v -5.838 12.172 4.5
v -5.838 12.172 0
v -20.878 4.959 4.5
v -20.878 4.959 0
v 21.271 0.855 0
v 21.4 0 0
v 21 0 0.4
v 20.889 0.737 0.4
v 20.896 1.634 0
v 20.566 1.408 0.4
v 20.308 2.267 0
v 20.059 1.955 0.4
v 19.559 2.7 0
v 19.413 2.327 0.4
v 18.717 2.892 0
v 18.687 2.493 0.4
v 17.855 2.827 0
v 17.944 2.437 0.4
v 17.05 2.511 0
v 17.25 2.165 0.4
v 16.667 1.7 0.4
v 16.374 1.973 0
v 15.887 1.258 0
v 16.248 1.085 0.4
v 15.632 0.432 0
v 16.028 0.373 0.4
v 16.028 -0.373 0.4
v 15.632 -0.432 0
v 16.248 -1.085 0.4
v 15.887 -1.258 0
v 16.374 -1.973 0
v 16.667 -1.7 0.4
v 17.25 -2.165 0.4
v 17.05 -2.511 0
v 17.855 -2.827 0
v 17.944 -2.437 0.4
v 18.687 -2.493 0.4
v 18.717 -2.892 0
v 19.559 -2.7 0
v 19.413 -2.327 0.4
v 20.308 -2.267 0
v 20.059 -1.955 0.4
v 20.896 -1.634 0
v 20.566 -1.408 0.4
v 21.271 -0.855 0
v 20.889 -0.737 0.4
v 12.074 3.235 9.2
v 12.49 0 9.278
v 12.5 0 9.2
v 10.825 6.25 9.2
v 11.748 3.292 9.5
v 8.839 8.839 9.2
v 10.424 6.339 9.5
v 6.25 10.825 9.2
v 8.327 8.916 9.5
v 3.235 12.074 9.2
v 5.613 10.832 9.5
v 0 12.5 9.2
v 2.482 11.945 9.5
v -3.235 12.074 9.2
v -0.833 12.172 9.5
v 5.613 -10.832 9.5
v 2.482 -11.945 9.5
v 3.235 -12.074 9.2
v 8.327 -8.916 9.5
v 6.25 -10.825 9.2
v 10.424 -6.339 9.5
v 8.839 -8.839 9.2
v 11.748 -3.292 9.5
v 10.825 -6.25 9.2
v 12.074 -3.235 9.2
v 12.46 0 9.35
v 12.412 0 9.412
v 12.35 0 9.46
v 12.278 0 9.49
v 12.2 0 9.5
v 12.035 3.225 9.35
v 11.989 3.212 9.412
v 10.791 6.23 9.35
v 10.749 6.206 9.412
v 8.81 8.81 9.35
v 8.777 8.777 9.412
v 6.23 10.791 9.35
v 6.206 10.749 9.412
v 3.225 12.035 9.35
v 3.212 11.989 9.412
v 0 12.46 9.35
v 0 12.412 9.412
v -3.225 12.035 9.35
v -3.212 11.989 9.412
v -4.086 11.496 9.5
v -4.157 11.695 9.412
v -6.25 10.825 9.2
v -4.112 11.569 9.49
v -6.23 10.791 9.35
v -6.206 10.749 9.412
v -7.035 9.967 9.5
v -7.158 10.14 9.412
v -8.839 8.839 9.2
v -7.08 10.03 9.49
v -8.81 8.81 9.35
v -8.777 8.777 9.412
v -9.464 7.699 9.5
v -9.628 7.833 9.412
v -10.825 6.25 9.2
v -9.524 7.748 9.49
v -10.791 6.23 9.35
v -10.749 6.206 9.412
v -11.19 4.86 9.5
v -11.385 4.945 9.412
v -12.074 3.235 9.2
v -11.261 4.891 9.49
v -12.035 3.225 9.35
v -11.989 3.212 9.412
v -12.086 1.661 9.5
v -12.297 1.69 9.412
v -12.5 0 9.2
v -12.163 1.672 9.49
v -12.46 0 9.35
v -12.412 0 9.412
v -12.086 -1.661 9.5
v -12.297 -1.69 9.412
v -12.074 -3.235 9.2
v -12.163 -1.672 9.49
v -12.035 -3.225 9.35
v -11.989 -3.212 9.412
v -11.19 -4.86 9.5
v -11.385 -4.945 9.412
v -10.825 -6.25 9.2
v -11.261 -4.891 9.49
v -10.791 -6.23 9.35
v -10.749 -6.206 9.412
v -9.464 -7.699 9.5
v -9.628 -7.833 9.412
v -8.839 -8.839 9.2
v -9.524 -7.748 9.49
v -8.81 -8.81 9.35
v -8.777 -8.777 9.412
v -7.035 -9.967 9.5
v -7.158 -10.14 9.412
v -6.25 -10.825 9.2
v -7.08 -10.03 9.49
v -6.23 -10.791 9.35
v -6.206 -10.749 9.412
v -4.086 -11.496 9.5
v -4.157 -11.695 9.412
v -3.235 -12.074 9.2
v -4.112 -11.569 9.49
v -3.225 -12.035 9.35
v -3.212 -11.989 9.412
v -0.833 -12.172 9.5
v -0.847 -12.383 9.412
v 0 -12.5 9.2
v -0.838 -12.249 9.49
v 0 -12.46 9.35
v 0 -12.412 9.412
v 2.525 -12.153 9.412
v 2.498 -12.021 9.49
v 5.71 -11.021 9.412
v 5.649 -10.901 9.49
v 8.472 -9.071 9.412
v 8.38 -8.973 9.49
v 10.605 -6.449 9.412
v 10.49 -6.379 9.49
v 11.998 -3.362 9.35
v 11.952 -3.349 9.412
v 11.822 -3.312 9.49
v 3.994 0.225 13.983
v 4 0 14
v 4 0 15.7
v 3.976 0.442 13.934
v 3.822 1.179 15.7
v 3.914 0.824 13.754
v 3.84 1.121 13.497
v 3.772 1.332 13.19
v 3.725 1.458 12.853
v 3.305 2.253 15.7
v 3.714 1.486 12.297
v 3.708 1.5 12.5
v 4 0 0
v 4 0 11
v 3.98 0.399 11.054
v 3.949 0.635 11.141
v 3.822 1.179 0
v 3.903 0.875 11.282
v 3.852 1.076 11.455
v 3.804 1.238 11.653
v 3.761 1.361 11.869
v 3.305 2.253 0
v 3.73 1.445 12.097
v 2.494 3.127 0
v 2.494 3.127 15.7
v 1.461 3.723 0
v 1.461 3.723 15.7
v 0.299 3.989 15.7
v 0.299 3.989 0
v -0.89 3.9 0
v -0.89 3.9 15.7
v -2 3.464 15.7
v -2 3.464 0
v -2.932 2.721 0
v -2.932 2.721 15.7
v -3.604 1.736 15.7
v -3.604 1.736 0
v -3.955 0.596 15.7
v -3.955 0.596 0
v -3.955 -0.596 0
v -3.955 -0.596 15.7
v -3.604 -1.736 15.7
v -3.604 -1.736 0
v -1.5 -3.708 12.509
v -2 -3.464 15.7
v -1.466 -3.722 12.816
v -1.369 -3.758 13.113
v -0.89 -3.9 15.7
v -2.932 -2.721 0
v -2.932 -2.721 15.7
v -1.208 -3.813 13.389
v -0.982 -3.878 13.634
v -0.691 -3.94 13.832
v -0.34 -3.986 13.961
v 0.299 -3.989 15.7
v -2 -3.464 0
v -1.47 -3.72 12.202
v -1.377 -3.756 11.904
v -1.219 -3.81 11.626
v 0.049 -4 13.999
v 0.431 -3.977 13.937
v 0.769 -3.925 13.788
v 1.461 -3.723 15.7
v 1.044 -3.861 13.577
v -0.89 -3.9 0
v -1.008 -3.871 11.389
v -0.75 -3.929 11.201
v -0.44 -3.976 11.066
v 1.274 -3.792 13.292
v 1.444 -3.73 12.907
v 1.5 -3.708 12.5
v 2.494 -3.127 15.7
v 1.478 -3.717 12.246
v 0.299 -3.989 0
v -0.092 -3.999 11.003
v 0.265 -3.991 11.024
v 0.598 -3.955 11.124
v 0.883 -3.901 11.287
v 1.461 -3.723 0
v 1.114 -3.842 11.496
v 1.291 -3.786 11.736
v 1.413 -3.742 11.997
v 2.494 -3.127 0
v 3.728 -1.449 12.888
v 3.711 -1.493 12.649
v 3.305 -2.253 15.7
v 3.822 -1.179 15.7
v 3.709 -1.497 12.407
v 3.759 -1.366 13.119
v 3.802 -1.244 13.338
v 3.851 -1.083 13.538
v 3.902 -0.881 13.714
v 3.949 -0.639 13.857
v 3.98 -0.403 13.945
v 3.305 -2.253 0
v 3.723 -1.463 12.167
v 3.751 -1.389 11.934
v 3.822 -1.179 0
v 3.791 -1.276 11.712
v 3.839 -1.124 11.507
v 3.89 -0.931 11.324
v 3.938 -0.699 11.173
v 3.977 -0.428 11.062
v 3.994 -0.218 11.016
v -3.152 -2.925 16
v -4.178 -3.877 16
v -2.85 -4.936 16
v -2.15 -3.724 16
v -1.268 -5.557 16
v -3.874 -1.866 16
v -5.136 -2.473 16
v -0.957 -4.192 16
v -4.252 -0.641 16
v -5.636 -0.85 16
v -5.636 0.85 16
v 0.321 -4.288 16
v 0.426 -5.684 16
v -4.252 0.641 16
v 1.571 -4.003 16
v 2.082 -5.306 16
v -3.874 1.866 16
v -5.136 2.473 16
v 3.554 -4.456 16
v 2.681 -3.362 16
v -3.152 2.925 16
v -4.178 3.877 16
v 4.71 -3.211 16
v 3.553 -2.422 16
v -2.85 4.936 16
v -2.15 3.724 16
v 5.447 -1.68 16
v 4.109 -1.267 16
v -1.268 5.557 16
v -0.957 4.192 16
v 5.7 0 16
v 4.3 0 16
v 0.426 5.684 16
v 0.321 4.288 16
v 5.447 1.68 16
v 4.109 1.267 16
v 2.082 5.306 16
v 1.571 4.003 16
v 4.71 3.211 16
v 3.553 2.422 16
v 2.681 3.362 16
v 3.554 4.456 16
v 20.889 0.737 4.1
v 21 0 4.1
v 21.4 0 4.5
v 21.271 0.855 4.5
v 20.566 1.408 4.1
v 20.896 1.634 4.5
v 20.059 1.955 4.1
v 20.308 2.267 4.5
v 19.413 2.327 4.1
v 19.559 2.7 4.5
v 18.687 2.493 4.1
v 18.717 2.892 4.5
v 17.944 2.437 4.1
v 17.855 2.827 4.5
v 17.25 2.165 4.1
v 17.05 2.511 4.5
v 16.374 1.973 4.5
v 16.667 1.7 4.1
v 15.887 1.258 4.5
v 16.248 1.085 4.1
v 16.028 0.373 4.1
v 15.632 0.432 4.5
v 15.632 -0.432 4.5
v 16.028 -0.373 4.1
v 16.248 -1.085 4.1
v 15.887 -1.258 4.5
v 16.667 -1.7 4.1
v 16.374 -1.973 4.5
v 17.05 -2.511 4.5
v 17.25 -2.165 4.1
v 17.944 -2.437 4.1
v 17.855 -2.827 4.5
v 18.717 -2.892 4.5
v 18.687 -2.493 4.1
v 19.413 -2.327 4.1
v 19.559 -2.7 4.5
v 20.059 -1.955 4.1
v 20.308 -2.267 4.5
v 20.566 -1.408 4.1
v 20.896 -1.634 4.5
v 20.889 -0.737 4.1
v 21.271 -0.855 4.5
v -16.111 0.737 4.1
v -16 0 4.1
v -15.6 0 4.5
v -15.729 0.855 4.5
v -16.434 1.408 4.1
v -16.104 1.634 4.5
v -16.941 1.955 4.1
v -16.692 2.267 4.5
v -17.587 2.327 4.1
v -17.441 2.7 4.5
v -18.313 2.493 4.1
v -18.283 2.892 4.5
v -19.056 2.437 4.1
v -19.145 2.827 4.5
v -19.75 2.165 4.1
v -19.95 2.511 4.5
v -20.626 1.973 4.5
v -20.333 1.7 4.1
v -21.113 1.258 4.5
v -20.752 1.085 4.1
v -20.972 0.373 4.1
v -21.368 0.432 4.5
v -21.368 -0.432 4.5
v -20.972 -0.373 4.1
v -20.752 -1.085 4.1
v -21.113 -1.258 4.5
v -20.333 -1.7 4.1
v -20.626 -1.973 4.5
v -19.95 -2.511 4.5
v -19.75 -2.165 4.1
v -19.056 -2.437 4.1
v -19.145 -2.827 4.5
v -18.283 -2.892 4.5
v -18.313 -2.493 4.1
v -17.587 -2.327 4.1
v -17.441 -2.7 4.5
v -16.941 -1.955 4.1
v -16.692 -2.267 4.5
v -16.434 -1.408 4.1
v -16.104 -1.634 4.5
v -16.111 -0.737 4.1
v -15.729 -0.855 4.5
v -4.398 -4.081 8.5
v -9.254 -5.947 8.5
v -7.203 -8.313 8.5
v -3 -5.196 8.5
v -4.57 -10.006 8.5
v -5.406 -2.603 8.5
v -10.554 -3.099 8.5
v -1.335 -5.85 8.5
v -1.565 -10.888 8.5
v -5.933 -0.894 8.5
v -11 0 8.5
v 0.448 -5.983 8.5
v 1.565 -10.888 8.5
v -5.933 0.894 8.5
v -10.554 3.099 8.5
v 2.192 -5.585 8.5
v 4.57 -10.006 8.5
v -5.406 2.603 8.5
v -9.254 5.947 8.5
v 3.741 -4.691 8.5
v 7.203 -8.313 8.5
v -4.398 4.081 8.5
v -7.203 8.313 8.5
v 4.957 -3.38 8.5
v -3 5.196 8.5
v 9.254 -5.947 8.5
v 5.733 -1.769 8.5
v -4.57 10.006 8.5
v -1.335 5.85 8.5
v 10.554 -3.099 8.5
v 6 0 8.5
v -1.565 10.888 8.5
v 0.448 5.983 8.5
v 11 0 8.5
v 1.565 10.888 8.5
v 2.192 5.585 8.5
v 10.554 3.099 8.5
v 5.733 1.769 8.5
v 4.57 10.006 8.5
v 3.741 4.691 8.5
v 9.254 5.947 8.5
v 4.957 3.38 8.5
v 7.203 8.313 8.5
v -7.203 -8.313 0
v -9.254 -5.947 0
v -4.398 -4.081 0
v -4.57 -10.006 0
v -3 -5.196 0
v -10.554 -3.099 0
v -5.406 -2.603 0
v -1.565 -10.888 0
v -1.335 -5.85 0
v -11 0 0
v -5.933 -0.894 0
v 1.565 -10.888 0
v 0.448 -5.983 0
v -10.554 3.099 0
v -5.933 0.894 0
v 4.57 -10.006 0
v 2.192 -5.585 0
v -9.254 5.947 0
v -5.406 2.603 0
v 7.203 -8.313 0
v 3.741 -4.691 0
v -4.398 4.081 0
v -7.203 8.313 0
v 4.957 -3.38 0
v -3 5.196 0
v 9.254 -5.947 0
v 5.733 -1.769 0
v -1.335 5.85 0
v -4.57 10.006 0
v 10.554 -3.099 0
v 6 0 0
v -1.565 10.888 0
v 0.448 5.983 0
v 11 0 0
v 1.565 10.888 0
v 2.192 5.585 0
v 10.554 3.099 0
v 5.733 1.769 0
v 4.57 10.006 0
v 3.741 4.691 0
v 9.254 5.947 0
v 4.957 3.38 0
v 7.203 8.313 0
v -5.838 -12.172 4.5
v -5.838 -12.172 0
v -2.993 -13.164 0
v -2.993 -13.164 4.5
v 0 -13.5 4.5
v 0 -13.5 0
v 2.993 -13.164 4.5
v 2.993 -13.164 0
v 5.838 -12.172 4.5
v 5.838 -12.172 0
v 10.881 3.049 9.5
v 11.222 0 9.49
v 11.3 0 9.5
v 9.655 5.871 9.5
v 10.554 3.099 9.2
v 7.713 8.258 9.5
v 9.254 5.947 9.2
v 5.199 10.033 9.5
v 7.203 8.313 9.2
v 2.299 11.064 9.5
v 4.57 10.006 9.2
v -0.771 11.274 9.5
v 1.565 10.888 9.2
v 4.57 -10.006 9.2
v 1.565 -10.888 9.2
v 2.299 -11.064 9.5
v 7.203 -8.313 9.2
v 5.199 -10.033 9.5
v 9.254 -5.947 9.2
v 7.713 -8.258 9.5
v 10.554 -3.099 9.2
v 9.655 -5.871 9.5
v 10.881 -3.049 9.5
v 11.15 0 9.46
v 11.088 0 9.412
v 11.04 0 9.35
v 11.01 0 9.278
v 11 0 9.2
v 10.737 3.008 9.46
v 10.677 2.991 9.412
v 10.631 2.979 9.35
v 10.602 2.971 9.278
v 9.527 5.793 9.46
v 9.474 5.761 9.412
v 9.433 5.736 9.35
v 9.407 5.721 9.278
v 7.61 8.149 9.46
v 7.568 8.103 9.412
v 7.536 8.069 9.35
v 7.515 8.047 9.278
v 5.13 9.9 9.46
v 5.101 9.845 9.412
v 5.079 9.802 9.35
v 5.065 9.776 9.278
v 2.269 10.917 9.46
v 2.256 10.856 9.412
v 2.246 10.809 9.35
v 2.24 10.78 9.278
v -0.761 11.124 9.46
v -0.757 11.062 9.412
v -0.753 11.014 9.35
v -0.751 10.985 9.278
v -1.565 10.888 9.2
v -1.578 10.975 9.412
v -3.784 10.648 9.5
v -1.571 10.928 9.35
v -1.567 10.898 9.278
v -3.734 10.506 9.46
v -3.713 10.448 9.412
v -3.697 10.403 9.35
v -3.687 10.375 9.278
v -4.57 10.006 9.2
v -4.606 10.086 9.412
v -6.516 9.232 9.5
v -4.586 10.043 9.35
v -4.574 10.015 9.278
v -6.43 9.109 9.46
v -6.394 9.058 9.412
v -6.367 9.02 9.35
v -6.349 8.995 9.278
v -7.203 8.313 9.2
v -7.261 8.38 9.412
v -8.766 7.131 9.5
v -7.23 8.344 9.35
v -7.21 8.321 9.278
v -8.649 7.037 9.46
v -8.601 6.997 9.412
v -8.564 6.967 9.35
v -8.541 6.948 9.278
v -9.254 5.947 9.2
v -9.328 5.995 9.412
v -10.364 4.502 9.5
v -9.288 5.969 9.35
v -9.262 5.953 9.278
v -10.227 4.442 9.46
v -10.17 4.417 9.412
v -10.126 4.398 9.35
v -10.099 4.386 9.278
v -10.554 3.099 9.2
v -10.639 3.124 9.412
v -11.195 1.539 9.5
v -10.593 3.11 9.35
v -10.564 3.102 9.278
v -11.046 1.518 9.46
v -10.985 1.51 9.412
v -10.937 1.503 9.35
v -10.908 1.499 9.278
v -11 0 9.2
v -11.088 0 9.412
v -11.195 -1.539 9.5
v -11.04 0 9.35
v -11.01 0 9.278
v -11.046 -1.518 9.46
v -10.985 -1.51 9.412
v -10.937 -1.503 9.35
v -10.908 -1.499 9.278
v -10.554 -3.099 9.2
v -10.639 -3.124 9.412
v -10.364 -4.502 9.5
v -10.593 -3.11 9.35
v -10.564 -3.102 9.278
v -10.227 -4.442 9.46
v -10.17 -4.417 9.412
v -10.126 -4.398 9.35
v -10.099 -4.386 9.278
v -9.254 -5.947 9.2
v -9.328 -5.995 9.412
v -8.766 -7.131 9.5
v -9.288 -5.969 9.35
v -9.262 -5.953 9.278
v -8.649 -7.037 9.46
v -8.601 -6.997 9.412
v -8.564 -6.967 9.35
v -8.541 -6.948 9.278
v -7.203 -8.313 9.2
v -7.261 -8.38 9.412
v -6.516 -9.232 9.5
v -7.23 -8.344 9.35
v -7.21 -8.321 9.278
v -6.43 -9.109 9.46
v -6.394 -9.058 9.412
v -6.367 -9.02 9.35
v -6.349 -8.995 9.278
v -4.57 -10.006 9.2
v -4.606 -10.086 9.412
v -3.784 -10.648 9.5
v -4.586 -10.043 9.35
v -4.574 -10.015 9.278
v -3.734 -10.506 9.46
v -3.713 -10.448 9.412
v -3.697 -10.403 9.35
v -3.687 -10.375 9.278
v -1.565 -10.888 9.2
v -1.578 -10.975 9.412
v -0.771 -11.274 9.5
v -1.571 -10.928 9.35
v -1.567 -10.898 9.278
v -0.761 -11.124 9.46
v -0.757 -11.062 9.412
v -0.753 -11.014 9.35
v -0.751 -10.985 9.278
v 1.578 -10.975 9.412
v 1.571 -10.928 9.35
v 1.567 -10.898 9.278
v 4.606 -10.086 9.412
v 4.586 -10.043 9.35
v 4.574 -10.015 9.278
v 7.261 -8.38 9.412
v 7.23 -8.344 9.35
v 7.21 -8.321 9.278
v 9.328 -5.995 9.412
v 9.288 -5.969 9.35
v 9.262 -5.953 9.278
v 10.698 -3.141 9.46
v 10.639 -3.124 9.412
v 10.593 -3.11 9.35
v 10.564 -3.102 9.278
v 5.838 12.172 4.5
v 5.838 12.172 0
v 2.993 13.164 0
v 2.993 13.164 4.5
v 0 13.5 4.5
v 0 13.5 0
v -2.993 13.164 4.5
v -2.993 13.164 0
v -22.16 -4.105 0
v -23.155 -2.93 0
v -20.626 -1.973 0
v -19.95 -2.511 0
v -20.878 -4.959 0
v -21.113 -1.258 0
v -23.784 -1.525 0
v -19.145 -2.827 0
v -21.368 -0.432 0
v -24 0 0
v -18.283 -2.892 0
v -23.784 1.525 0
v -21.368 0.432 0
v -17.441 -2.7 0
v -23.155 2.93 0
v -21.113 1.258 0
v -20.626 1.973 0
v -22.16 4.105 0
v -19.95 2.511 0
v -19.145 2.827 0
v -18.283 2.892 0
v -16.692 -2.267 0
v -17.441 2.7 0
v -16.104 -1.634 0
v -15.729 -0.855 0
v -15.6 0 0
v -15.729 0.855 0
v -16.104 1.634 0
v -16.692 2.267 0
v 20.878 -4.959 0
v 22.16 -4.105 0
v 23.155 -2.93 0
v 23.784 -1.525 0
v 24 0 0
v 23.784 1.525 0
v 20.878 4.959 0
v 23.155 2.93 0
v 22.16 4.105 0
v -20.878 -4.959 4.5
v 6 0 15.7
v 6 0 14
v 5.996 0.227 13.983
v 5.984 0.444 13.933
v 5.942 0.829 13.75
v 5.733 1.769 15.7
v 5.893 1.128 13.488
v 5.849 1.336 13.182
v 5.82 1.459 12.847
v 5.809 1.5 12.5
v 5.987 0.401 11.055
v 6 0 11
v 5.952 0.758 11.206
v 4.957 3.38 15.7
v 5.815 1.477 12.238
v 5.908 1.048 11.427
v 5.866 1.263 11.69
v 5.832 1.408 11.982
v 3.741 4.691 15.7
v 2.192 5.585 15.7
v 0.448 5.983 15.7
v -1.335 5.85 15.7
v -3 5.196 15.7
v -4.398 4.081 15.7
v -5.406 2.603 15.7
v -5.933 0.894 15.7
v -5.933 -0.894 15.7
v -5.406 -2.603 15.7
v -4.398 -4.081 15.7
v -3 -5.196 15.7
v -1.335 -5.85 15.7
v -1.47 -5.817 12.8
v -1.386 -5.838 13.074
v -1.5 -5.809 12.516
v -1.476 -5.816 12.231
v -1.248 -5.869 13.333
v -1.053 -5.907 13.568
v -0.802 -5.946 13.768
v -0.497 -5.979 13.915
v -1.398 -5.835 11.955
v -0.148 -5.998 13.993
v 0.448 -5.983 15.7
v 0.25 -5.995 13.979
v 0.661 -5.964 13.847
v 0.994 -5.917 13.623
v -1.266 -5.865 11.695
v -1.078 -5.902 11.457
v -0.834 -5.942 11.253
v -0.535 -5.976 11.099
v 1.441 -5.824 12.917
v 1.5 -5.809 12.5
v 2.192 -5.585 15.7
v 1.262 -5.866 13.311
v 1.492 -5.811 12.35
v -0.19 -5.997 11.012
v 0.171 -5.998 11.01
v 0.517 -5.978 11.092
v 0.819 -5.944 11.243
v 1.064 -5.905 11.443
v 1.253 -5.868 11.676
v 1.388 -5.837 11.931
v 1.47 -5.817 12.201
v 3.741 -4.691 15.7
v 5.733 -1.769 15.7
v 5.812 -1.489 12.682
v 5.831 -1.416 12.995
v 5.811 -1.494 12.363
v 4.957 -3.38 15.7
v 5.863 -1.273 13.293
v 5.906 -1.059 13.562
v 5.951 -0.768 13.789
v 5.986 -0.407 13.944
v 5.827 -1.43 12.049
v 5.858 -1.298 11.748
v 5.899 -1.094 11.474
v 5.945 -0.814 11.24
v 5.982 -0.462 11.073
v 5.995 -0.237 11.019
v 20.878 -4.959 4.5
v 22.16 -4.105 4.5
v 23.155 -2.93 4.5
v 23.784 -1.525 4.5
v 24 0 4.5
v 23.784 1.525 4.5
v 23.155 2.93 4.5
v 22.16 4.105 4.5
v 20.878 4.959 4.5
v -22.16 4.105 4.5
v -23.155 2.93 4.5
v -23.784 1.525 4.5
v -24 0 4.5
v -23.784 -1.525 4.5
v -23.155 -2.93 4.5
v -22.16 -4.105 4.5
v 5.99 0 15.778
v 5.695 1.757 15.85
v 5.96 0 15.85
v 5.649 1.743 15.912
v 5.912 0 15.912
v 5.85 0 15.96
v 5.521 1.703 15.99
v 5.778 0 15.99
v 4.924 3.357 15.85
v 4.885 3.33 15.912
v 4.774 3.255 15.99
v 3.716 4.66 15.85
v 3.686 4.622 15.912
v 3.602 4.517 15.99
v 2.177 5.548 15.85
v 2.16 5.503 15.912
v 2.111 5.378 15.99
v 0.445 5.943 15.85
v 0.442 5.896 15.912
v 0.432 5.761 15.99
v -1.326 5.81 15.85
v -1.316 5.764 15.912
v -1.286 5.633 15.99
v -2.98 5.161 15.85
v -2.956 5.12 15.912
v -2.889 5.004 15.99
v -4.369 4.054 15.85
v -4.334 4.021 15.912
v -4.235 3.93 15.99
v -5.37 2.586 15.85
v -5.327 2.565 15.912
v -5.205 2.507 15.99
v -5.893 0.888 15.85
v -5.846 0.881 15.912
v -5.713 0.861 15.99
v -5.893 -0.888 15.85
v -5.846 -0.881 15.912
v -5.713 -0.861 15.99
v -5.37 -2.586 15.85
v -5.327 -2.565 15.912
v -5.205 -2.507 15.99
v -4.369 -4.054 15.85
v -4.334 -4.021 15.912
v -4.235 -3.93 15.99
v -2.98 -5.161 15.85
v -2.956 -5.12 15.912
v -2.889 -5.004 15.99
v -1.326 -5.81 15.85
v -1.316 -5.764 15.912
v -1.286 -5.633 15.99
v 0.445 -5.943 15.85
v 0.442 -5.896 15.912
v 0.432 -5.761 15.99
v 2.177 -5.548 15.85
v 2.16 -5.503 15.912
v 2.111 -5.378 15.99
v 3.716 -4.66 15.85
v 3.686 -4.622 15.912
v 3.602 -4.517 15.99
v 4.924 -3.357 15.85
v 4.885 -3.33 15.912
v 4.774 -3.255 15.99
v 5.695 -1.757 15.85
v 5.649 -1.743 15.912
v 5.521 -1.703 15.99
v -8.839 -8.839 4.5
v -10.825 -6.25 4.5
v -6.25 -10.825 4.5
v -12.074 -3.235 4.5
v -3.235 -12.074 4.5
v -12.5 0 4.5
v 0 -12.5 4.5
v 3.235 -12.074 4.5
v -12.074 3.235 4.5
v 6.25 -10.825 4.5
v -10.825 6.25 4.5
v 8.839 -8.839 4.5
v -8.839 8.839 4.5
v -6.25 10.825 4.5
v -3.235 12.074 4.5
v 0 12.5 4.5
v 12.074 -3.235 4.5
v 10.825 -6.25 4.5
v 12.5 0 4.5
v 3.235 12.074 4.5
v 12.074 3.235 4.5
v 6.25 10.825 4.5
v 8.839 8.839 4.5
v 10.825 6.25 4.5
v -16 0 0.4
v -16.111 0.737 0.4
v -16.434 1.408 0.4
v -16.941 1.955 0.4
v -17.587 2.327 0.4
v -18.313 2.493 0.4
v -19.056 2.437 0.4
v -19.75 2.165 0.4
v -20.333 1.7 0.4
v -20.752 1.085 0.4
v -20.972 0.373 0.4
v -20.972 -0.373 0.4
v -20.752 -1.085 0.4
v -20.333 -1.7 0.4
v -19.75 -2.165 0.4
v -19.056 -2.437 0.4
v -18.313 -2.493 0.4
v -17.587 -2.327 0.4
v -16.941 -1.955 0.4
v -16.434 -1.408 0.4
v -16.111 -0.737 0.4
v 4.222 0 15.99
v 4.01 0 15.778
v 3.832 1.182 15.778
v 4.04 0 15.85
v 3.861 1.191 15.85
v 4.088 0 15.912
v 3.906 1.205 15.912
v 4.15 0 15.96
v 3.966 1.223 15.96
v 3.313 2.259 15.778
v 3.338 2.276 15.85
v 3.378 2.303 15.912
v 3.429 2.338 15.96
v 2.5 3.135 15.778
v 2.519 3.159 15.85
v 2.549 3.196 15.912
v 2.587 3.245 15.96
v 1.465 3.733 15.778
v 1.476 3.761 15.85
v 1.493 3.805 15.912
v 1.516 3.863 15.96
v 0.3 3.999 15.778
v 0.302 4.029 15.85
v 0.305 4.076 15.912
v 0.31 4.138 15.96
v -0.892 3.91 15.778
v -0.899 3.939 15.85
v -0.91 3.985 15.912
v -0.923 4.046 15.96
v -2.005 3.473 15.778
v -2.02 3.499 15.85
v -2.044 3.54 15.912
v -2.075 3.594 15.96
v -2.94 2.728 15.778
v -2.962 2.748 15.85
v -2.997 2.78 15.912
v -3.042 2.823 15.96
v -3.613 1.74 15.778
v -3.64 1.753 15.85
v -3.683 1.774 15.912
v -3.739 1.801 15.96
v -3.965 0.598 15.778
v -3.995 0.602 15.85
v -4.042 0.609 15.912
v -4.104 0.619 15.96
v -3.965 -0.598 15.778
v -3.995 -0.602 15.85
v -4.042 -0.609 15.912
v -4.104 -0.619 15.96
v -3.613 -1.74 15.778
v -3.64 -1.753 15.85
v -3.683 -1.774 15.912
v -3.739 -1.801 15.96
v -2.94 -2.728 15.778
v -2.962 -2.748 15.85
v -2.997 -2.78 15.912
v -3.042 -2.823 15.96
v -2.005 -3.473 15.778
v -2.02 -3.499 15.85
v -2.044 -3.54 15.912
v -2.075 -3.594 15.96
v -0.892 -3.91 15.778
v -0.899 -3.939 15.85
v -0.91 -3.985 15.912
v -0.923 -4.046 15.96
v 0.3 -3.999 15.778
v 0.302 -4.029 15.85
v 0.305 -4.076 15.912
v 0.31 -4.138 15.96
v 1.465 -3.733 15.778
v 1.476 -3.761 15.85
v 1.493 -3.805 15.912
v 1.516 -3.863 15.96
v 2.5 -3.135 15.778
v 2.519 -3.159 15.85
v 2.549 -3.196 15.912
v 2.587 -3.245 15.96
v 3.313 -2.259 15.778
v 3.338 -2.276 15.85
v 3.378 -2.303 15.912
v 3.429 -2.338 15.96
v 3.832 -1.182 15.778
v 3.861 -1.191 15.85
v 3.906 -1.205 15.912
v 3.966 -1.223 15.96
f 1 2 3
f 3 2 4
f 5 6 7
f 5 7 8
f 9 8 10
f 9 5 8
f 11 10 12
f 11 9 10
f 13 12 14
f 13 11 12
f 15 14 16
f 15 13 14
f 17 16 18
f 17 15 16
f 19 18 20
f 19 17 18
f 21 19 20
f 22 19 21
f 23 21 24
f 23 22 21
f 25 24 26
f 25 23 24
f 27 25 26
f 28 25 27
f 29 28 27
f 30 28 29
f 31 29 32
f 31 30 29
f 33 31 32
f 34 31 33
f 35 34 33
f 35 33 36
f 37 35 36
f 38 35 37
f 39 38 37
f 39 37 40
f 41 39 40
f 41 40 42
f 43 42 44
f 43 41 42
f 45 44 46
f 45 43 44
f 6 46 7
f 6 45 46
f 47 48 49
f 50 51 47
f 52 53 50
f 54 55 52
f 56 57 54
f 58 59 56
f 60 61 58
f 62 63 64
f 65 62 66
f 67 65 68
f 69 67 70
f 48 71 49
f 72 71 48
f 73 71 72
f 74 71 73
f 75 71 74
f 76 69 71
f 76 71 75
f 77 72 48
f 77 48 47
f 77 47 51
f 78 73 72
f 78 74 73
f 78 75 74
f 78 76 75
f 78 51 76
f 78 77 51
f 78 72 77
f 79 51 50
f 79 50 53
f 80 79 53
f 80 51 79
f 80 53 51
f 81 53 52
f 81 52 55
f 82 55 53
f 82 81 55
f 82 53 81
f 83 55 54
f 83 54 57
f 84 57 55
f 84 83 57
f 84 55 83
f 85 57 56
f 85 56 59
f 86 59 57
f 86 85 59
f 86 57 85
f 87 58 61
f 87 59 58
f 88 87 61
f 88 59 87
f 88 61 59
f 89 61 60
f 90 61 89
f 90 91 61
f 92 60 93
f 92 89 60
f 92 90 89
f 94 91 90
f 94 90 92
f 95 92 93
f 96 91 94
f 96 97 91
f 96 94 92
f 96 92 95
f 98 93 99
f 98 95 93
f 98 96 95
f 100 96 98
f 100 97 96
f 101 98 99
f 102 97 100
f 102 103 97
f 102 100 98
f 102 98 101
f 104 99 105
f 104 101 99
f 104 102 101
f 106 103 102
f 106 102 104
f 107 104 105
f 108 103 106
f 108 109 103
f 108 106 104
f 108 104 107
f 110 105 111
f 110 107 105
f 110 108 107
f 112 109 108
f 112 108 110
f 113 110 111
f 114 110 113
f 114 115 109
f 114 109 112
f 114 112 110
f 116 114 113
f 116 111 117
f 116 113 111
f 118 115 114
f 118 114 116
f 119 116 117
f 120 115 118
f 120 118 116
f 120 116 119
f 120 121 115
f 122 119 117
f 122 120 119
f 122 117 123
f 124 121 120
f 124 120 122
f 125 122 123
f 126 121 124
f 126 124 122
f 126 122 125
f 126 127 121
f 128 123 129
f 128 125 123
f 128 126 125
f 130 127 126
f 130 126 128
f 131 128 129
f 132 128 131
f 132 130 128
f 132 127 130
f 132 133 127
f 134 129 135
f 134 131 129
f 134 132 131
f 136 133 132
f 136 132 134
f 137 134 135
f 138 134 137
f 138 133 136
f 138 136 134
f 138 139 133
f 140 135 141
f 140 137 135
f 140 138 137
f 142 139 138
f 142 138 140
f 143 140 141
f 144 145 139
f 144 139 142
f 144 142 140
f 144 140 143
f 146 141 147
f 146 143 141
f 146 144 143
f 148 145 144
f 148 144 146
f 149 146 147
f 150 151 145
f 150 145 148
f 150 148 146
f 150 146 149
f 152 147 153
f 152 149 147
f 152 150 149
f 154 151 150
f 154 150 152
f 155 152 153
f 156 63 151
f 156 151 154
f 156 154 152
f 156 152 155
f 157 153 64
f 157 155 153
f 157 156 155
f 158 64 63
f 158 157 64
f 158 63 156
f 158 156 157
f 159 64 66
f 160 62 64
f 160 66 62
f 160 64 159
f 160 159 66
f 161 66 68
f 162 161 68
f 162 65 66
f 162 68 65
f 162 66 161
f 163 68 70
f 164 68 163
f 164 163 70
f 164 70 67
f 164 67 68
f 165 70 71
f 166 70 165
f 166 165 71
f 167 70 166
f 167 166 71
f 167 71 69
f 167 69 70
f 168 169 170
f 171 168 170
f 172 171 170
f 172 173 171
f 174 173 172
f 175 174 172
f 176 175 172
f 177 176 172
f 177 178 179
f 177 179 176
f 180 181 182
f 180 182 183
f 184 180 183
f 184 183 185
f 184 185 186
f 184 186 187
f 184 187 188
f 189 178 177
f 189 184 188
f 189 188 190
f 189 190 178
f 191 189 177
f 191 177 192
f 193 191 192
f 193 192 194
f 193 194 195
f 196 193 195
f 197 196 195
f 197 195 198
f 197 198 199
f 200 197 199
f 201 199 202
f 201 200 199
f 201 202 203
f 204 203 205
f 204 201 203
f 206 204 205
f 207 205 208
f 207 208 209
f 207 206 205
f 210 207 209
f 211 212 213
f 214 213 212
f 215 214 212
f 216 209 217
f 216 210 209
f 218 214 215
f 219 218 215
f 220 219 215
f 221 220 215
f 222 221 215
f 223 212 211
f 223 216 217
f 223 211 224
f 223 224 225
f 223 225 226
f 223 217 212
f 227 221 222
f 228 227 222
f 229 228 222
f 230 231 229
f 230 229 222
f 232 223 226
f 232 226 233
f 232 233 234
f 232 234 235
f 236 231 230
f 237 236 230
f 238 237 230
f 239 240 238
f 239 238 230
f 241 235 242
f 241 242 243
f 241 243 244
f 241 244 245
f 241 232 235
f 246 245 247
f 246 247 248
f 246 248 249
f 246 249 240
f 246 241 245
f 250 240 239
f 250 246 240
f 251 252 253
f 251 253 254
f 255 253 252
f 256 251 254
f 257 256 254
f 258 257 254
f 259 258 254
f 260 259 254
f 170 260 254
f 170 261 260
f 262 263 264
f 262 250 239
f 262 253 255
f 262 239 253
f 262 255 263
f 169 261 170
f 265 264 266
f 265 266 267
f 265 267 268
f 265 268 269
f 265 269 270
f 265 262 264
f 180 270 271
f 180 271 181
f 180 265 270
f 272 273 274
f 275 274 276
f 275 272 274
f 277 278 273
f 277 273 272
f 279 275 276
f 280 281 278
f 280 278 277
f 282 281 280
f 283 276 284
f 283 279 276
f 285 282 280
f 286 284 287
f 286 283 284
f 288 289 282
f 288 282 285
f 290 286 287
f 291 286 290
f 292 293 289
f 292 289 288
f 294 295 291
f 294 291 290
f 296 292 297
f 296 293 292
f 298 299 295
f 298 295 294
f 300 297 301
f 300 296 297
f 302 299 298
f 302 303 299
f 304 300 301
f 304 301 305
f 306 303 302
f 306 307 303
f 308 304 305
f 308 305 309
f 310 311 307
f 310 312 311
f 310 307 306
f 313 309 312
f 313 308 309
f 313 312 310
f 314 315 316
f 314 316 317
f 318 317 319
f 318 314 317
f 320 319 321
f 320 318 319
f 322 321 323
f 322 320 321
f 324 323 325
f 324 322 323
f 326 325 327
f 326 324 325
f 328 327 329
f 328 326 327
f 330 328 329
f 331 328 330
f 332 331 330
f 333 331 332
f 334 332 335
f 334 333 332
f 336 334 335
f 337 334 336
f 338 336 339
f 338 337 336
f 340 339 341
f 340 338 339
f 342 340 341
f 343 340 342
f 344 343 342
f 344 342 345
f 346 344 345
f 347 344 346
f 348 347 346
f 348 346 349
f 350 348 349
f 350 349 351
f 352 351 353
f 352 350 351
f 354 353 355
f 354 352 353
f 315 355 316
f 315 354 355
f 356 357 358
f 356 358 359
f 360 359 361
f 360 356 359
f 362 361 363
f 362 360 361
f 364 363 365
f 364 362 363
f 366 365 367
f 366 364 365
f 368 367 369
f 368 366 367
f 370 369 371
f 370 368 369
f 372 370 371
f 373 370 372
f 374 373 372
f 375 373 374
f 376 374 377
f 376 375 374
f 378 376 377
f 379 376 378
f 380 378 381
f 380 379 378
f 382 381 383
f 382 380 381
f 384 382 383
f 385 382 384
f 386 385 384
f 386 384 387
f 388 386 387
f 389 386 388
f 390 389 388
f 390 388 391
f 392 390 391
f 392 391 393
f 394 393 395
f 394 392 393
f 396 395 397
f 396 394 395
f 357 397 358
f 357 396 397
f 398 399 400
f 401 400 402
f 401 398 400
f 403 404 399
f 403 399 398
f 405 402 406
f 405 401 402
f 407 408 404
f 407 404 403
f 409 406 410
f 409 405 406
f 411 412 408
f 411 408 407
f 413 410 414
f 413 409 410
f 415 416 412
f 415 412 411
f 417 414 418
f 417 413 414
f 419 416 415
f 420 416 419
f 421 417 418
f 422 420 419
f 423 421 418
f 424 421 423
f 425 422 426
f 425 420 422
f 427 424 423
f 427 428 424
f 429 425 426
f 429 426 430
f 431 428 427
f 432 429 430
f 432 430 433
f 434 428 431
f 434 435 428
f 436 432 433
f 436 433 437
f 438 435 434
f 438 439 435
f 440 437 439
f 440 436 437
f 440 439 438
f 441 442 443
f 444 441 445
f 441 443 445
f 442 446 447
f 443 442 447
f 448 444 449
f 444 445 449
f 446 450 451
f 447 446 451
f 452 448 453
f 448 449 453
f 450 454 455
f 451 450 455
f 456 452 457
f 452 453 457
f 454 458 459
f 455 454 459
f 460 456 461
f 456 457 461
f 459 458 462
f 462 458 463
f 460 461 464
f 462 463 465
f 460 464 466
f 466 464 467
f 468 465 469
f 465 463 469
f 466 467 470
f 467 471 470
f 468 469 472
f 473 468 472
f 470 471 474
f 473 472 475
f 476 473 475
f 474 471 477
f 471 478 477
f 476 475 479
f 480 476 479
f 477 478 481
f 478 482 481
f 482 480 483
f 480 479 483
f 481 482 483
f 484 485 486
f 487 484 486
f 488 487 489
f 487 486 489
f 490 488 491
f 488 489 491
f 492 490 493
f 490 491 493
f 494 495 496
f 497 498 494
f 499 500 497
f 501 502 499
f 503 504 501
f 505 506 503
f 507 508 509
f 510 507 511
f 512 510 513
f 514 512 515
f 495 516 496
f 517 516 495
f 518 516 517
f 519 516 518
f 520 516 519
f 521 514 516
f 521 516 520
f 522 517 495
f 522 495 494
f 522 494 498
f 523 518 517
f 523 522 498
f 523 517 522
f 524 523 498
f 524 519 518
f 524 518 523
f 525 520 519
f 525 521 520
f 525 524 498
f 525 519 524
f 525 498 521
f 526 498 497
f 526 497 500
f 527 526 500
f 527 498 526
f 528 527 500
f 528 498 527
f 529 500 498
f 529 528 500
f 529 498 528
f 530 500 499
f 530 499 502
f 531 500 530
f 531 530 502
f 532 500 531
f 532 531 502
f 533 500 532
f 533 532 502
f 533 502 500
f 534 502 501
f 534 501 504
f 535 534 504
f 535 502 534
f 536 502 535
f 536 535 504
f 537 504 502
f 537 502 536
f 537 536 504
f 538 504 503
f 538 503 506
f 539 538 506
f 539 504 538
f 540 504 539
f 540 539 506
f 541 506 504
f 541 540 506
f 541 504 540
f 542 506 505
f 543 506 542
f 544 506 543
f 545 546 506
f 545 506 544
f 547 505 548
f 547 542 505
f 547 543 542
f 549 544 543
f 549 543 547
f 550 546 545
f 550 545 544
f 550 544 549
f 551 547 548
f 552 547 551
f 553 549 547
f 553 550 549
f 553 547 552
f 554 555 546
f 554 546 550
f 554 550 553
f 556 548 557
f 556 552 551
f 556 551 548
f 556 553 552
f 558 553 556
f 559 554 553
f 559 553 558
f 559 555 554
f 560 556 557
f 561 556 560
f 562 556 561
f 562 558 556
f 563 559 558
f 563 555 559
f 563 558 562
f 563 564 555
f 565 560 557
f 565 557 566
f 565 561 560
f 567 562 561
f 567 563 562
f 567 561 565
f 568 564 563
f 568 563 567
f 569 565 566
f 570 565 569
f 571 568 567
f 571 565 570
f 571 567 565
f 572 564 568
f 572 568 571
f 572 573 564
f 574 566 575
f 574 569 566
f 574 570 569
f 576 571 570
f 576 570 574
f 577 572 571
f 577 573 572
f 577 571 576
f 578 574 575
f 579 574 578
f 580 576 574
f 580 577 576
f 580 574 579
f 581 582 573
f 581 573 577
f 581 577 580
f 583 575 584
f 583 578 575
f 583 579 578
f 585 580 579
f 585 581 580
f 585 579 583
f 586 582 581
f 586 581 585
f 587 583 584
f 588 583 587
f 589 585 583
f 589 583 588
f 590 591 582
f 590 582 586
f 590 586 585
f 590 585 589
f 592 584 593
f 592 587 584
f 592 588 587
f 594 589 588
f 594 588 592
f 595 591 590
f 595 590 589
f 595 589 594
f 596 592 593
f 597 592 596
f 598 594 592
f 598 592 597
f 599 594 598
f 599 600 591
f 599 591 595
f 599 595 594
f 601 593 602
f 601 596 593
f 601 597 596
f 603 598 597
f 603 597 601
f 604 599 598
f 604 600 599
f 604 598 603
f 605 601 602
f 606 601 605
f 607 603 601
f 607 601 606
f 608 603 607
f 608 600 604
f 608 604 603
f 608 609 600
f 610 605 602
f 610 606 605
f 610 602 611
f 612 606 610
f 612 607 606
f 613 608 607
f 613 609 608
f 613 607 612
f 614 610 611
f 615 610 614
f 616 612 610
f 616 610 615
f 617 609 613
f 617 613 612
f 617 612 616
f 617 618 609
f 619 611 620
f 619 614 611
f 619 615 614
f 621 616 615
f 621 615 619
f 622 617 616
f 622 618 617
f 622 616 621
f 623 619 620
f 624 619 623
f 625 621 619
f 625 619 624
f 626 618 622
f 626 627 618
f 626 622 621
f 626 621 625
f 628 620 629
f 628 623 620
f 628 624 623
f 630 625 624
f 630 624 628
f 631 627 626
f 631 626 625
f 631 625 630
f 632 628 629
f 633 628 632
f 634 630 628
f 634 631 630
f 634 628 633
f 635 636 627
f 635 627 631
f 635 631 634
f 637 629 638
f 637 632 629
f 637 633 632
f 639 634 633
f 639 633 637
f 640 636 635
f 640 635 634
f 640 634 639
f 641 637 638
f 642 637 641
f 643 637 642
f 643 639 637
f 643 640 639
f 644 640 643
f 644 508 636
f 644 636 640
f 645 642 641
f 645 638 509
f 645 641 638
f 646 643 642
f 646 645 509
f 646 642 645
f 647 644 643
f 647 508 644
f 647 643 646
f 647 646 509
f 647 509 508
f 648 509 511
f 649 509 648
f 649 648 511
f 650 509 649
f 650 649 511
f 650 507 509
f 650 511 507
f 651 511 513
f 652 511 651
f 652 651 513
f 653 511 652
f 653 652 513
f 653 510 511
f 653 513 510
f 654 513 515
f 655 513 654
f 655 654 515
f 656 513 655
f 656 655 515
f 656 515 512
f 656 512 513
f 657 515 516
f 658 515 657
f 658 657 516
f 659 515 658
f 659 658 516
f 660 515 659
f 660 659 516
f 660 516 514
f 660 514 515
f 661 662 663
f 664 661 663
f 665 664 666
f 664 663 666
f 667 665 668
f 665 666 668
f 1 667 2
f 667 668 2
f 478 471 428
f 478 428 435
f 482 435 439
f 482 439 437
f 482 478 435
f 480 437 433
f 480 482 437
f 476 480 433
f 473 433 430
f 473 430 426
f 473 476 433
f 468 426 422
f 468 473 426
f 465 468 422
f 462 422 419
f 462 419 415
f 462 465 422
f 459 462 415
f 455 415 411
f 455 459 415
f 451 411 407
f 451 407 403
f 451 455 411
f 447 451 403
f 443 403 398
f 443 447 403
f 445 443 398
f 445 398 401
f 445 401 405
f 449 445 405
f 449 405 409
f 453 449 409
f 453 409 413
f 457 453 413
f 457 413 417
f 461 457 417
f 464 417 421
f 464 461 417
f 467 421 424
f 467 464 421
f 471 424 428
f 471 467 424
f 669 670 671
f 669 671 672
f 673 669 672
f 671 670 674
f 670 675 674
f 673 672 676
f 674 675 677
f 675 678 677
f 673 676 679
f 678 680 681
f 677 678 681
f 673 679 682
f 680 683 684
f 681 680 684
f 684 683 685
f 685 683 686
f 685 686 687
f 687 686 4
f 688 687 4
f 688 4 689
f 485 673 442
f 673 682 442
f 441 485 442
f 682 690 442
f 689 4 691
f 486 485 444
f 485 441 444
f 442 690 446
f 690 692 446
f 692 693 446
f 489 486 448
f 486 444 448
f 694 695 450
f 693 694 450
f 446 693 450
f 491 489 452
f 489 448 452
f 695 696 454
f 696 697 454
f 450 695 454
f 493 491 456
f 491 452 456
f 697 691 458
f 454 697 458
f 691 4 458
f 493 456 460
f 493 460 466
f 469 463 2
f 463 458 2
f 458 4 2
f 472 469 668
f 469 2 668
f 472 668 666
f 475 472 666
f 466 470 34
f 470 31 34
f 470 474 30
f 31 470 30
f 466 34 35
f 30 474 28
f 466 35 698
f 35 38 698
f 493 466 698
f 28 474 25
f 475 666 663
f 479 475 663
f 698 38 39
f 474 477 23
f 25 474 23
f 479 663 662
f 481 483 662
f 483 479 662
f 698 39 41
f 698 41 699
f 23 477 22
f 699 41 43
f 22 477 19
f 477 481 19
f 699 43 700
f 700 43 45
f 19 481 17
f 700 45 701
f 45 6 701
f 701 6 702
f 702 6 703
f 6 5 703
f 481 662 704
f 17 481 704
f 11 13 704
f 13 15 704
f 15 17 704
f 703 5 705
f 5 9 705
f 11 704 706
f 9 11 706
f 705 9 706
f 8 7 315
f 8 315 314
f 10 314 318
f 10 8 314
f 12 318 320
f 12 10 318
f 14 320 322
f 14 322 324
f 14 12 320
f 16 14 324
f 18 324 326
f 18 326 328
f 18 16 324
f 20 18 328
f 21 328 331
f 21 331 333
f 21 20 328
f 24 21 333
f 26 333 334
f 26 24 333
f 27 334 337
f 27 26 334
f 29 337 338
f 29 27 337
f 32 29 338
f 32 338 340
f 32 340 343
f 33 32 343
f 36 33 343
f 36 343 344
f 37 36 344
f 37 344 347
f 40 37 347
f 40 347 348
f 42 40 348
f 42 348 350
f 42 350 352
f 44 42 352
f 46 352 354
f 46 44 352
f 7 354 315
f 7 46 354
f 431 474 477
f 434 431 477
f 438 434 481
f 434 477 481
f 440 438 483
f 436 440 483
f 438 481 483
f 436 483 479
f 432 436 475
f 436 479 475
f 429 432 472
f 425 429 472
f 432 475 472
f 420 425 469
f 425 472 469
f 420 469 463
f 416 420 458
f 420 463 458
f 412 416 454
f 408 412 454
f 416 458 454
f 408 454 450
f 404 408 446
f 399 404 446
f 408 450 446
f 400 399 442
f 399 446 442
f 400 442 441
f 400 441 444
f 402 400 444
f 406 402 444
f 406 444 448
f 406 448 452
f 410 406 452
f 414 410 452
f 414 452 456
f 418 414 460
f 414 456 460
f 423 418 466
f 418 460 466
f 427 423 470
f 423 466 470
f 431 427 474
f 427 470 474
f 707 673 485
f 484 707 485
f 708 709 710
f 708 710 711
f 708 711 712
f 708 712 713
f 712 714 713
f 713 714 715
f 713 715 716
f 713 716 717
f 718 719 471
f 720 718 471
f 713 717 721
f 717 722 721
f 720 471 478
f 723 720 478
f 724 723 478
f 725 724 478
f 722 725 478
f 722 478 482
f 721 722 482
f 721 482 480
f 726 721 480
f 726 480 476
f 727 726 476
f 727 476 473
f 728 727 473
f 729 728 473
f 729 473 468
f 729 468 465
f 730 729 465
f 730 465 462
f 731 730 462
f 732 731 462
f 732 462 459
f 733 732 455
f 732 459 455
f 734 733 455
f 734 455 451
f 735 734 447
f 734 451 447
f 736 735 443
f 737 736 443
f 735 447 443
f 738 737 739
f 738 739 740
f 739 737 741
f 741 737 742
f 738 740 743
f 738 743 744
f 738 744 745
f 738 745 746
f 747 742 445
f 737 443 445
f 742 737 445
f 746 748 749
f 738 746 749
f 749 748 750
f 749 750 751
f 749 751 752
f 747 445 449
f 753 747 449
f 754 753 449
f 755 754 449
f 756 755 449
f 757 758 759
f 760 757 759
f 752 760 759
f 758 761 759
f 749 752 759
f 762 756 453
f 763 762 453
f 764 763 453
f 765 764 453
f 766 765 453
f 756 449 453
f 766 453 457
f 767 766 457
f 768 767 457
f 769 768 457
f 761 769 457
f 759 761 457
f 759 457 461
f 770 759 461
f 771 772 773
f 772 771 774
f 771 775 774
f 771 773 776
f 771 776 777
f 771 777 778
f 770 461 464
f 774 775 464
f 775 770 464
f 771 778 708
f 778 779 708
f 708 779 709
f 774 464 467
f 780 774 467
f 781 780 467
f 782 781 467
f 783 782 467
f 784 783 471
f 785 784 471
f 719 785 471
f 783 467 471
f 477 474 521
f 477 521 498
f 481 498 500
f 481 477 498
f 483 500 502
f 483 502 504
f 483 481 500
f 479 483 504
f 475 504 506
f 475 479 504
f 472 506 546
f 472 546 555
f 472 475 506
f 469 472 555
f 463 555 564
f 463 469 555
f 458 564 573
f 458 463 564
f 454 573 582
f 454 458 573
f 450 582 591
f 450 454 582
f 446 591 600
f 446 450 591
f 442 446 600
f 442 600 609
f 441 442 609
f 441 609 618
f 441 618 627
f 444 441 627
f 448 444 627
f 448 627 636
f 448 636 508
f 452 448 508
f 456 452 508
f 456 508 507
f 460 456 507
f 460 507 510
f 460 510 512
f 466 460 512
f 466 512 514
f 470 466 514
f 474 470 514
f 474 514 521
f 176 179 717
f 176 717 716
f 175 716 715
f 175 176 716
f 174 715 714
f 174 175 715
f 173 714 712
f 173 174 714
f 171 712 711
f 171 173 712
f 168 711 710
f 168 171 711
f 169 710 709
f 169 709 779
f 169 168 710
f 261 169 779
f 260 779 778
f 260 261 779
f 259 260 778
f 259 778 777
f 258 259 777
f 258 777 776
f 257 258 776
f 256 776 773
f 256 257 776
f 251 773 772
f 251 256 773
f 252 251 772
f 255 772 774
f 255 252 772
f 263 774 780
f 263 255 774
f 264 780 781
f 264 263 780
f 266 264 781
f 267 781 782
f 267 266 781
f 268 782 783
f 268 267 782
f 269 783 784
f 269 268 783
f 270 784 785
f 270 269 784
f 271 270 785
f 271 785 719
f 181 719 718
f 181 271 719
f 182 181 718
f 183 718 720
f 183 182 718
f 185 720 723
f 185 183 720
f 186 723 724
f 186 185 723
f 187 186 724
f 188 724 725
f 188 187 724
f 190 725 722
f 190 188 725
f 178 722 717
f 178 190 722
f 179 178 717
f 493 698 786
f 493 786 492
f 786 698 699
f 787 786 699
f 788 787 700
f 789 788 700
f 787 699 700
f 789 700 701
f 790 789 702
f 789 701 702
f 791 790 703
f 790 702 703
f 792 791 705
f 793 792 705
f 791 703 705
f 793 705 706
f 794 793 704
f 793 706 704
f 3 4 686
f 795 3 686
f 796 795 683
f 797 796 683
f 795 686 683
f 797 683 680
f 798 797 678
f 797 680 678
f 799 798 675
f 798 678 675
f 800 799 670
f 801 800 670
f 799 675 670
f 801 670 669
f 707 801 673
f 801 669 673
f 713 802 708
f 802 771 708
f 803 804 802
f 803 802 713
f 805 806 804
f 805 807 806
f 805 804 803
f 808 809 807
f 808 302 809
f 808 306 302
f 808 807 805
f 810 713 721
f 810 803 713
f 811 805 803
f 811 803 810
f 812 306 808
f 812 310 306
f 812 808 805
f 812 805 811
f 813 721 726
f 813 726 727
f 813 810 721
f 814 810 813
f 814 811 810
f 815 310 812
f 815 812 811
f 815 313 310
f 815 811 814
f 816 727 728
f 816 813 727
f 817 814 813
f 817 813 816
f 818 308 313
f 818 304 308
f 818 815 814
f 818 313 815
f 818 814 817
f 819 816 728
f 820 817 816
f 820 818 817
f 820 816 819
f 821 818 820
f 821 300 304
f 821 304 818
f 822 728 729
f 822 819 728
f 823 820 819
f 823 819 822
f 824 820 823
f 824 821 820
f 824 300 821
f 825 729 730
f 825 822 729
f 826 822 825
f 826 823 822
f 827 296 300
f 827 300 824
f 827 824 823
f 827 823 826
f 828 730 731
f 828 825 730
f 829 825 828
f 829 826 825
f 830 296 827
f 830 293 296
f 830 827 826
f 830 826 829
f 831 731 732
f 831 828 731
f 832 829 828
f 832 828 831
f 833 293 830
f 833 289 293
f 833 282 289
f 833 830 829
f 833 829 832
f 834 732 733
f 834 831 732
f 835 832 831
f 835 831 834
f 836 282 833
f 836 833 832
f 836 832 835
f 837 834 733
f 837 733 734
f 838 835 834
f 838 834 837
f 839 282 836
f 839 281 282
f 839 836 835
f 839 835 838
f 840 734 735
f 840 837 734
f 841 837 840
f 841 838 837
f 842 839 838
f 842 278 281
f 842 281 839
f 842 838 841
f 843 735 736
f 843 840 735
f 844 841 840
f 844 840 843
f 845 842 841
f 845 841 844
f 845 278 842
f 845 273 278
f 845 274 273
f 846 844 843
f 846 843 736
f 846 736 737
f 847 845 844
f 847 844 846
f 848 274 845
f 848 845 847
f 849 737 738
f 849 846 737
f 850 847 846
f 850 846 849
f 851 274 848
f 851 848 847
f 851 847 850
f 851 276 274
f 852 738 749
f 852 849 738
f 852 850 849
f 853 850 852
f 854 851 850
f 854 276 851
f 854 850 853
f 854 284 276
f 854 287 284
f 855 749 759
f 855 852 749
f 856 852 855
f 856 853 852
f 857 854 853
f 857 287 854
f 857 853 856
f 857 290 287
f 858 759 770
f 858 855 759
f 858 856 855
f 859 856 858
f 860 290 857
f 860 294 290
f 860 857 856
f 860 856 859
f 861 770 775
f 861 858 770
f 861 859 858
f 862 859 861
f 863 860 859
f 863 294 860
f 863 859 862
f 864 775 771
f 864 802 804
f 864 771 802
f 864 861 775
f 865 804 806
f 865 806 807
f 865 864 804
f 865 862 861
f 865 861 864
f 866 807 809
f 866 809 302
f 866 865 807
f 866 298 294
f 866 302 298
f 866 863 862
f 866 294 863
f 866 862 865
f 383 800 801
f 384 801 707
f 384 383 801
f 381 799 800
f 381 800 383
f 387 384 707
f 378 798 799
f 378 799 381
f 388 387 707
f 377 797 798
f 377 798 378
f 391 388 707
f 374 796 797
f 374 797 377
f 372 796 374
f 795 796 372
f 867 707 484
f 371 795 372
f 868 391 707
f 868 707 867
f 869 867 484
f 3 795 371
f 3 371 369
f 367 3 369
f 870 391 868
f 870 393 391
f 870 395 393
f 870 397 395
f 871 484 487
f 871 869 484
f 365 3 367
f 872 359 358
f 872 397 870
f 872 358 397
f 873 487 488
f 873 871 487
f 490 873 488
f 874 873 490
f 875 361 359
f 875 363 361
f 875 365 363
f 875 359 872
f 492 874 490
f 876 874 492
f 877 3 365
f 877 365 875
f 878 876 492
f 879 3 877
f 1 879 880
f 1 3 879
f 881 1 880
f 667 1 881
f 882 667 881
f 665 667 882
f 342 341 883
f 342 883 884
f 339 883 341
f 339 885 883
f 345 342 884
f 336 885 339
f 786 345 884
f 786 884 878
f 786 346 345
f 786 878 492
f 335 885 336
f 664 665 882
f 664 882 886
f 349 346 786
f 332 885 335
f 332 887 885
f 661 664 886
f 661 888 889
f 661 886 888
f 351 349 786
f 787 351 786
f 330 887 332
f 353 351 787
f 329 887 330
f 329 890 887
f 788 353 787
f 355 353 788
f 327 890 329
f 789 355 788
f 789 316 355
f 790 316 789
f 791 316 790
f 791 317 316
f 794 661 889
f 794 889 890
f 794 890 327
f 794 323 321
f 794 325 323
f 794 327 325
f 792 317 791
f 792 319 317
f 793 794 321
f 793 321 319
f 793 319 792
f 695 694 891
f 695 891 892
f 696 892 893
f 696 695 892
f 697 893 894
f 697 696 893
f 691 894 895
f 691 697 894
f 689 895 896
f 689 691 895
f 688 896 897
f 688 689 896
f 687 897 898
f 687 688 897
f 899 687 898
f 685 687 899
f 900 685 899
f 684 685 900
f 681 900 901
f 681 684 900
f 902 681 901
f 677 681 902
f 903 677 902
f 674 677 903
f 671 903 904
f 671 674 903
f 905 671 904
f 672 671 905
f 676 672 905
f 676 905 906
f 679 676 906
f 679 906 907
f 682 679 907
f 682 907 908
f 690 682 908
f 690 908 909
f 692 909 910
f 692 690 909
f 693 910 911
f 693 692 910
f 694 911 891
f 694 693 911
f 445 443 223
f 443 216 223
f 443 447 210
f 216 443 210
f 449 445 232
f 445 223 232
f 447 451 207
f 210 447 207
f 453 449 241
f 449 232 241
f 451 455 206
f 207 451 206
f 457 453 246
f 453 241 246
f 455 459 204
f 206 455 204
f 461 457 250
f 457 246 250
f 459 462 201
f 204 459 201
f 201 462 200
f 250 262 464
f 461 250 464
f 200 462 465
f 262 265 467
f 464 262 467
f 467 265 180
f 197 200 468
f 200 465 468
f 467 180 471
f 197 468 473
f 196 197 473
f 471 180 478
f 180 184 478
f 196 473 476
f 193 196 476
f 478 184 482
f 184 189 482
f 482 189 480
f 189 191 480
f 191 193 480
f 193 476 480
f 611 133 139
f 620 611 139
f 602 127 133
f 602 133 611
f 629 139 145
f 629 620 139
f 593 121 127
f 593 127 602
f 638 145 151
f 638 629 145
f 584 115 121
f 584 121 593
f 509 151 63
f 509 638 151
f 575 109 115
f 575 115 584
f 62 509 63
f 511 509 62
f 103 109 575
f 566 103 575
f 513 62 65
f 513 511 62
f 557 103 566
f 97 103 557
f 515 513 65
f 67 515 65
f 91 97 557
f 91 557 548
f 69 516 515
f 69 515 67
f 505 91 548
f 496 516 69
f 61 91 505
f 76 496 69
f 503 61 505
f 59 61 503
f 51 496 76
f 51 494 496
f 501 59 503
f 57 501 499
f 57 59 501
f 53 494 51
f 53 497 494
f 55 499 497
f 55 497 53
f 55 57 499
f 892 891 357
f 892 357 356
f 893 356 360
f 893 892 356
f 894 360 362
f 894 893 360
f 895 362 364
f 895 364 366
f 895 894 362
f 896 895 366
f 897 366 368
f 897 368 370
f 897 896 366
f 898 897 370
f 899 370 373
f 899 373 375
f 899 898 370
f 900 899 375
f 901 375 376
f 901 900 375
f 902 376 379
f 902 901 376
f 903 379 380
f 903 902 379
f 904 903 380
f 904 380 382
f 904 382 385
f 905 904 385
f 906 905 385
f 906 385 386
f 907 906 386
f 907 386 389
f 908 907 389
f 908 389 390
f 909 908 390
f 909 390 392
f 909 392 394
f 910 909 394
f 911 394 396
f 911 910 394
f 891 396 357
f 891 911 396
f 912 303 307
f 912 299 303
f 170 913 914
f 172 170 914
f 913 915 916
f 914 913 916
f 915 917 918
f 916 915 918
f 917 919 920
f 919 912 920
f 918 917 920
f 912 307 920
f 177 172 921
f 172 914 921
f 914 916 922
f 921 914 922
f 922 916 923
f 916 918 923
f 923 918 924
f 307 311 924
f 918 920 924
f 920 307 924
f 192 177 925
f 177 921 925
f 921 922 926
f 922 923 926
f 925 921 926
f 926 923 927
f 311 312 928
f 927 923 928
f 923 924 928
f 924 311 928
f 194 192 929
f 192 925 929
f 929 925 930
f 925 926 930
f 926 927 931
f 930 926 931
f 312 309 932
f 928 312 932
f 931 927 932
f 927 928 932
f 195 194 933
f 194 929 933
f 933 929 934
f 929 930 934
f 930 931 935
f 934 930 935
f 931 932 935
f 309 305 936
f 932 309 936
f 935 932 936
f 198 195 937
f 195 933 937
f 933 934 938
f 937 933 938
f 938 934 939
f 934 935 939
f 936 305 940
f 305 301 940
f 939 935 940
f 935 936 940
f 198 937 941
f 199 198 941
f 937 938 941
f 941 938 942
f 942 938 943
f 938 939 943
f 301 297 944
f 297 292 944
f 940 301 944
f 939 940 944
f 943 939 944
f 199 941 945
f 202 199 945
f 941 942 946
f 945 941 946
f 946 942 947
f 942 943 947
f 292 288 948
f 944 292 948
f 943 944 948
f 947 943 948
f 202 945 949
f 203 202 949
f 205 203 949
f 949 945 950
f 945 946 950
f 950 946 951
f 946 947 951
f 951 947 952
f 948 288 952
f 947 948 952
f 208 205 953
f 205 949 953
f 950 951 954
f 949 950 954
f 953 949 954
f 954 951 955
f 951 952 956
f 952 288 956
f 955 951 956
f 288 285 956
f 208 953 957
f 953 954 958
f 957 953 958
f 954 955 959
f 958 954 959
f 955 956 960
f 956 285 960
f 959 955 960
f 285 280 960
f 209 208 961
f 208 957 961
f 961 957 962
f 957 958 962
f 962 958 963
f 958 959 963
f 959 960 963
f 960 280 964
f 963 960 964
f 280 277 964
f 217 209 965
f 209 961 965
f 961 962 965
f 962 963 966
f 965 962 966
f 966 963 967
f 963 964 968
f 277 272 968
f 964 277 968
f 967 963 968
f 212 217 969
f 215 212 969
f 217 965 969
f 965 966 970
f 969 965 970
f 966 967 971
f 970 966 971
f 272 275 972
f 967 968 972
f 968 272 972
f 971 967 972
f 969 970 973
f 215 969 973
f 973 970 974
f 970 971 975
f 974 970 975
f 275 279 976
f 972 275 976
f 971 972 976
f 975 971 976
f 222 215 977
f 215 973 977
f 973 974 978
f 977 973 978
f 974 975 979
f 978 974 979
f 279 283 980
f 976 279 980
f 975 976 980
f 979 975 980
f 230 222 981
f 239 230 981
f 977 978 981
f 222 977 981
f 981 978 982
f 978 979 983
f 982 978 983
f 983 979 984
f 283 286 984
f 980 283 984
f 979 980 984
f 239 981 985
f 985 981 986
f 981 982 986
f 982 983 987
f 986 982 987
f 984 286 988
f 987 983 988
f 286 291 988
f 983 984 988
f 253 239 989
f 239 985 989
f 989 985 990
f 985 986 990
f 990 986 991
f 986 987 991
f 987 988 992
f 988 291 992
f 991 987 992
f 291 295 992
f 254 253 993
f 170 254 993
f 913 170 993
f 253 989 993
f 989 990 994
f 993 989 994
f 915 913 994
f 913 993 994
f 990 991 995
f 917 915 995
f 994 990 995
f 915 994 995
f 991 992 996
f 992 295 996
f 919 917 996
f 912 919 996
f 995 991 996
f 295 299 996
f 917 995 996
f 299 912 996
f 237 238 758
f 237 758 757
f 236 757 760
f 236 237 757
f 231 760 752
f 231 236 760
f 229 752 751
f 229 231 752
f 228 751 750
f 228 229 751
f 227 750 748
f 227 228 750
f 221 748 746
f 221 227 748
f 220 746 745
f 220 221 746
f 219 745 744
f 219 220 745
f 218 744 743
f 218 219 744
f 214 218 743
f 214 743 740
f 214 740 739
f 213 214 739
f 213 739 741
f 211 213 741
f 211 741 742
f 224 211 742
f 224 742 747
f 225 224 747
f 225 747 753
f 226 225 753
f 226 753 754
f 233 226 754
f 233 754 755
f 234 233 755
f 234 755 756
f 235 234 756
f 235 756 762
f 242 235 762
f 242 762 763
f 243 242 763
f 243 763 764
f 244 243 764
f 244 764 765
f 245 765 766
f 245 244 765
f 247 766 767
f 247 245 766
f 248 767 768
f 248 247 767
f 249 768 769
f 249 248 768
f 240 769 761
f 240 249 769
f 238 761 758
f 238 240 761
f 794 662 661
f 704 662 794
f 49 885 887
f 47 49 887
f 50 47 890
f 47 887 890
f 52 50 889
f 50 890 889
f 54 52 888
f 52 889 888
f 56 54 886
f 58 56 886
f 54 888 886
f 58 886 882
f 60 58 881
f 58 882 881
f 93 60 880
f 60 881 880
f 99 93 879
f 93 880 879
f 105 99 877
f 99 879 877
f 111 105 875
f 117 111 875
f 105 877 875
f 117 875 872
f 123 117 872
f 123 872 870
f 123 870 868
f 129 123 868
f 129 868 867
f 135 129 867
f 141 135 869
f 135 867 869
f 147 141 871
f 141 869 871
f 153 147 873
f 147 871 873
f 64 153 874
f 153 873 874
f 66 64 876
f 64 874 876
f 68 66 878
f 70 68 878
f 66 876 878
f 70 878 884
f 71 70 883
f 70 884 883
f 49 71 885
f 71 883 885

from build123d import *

# Parameters (mm, degrees)
SKETCH_R          = 6
SKETCH_R_2        = 4
PAD_DEPTH         = 16
FILLET001_R       = 0.3
CYLINDER_R        = 1.5
CYLINDER_DEPTH    = 8
CYLINDER001_R     = 1.5
CYLINDER001_DEPTH = 10
SKETCH001_R       = 11
SKETCH001_R_2     = 6
PAD001_DEPTH      = 8.5
SKETCH002_R       = 2.5
SKETCH002_R_2     = 11
PAD002_DEPTH      = 4.5
SKETCH003_R       = 12.5
SKETCH003_R_2     = 11
PAD003_DEPTH      = 5
FILLET_R          = 0.3
CHAMFER_SIZE      = 0.4


with BuildPart() as body:
    # Sketch → Pad (new body)
    with BuildSketch(Plane.XY):
        Circle(SKETCH_R)
        Circle(SKETCH_R_2, mode=Mode.SUBTRACT)
    extrude(amount=PAD_DEPTH)

    # Fillet001
    fillet001_edges = [body.edges().sort_by_distance(p)[0] for p in [
        (-6, 0, 16),
        (-4, 0, 16),
    ]]
    fillet(fillet001_edges, radius=FILLET001_R)

    # Cylinder → Cylinder (cut)
    with BuildSketch(Plane(origin=(0, 0, 12.5), x_dir=(0, 1, 0), z_dir=(1, 0, 0))):
        Circle(CYLINDER_R)
    extrude(amount=CYLINDER_DEPTH, mode=Mode.SUBTRACT)

    # Cylinder001 → Cylinder001 (cut)
    with BuildSketch(Plane(origin=(0, 0, 12.5), x_dir=(1, 0, 0), z_dir=(0, -1, 0))):
        Circle(CYLINDER001_R)
    extrude(amount=CYLINDER001_DEPTH, mode=Mode.SUBTRACT)


with BuildPart() as body001:
    # Sketch001 → Pad001 (new body)
    with BuildSketch(Plane.XY):
        Circle(SKETCH001_R)
        Circle(SKETCH001_R_2, mode=Mode.SUBTRACT)
    extrude(amount=PAD001_DEPTH)


with BuildPart() as body002:
    # Sketch002 → Pad002 (new body)
    with BuildSketch(Plane.XY):
        with BuildLine():
            ThreePointArc((-20.878378, 4.959165), (-24, 0), (-20.878378, -4.959165))
            Line((-20.878378, -4.959165), (-5.837838, -12.172496))
            ThreePointArc((-5.837838, -12.172496), (0, -13.5), (5.837838, -12.172496))
            Line((20.878378, -4.959165), (5.837838, -12.172496))
            ThreePointArc((20.878378, -4.959165), (24, 0), (20.878378, 4.959165))
            Line((5.837838, 12.172496), (20.878378, 4.959165))
            ThreePointArc((5.837838, 12.172496), (0, 13.5), (-5.837838, 12.172496))
            Line((-5.837838, 12.172496), (-20.878378, 4.959165))
        make_face()
        with Locations((-18.5, 0)):
            Circle(SKETCH002_R, mode=Mode.SUBTRACT)
        with Locations((18.5, 0)):
            Circle(SKETCH002_R, mode=Mode.SUBTRACT)
        Circle(SKETCH002_R_2, mode=Mode.SUBTRACT)
    extrude(amount=PAD002_DEPTH)

    # Sketch003 (on Face13 of Pad002) → Pad003 (join)
    with BuildSketch(Plane.XY.offset(4.5)):
        Circle(SKETCH003_R)
        Circle(SKETCH003_R_2, mode=Mode.SUBTRACT)
    extrude(amount=PAD003_DEPTH)

    # Fillet
    fillet_edges = [body002.edges().sort_by_distance(p)[0] for p in [
        (-12.5, 0, 9.5),
        (-11, 0, 9.5),
    ]]
    fillet(fillet_edges, radius=FILLET_R)

    # Chamfer
    chamfer_edges = [body002.edges().sort_by_distance(p)[0] for p in [
        (-21, 0, 4.5),
        (16, 0, 4.5),
        (-21, 0, 0),
        (16, 0, 0),
    ]]
    chamfer(chamfer_edges, length=CHAMFER_SIZE)


solid = Compound([body.part, body001.part, body002.part])
